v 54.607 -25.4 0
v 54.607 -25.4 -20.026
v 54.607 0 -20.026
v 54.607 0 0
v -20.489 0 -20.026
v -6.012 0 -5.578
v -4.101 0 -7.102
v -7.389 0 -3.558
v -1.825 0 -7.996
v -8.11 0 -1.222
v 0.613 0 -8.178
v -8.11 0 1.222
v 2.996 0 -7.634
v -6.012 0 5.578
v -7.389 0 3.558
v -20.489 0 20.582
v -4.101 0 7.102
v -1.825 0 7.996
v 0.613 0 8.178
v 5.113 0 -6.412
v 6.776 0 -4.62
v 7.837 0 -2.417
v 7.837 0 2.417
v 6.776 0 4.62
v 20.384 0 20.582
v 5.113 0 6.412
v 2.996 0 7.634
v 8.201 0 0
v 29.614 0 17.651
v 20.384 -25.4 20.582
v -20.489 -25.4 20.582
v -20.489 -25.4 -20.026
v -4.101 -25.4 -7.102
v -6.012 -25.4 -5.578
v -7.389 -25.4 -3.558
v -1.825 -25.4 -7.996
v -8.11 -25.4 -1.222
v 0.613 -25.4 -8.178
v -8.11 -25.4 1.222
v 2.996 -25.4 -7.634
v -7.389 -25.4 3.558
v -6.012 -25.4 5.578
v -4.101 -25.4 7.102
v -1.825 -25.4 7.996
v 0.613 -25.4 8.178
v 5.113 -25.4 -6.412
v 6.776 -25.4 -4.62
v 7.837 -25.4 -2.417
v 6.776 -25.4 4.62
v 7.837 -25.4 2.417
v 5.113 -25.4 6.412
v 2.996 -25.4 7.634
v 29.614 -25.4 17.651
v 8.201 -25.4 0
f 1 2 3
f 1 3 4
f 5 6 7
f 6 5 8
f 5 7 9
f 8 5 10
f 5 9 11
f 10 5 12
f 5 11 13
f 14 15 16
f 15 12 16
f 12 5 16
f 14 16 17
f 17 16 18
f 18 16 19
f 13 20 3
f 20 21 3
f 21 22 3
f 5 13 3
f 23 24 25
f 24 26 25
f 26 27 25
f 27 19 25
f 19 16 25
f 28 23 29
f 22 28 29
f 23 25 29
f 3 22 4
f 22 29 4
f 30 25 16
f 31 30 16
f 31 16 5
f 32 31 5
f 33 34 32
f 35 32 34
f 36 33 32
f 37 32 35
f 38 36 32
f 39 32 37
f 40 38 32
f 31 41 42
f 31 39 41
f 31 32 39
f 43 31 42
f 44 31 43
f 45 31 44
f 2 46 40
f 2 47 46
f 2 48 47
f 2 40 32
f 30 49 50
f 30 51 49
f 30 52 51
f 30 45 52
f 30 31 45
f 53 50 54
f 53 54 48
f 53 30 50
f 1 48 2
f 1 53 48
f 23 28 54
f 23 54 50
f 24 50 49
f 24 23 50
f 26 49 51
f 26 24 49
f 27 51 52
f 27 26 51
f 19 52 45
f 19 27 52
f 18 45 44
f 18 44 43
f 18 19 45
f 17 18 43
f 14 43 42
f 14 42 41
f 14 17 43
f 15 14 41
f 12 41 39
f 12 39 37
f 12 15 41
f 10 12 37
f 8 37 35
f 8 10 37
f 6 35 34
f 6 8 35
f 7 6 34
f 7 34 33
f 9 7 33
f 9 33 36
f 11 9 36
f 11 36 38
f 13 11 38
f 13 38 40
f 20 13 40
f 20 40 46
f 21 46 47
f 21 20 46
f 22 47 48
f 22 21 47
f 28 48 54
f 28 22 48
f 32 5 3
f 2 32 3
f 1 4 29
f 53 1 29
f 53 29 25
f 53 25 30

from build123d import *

# Parameters (mm, degrees)
F0_R     = 8.201166
F1_DEPTH = 25.4
F2_SIZE  = 5.08


with BuildPart() as f1:
    # F0 (on Front) → F1 (new body)
    with BuildSketch(Plane.XZ):
        Polygon((25.464479, 20.581946), (-20.489236, 20.581946), (-20.489236, -20.025678), (54.607056, -20.025678), (54.607056, 0), align=None)
        Circle(F0_R, mode=Mode.SUBTRACT)
    extrude(amount=F1_DEPTH)

    # F2
    f2_edges = [f1.edges().sort_by_distance(p)[0] for p in [
        (25.464479, -12.7, 20.581946),
    ]]
    chamfer(f2_edges, length=F2_SIZE)


solid = f1.part
